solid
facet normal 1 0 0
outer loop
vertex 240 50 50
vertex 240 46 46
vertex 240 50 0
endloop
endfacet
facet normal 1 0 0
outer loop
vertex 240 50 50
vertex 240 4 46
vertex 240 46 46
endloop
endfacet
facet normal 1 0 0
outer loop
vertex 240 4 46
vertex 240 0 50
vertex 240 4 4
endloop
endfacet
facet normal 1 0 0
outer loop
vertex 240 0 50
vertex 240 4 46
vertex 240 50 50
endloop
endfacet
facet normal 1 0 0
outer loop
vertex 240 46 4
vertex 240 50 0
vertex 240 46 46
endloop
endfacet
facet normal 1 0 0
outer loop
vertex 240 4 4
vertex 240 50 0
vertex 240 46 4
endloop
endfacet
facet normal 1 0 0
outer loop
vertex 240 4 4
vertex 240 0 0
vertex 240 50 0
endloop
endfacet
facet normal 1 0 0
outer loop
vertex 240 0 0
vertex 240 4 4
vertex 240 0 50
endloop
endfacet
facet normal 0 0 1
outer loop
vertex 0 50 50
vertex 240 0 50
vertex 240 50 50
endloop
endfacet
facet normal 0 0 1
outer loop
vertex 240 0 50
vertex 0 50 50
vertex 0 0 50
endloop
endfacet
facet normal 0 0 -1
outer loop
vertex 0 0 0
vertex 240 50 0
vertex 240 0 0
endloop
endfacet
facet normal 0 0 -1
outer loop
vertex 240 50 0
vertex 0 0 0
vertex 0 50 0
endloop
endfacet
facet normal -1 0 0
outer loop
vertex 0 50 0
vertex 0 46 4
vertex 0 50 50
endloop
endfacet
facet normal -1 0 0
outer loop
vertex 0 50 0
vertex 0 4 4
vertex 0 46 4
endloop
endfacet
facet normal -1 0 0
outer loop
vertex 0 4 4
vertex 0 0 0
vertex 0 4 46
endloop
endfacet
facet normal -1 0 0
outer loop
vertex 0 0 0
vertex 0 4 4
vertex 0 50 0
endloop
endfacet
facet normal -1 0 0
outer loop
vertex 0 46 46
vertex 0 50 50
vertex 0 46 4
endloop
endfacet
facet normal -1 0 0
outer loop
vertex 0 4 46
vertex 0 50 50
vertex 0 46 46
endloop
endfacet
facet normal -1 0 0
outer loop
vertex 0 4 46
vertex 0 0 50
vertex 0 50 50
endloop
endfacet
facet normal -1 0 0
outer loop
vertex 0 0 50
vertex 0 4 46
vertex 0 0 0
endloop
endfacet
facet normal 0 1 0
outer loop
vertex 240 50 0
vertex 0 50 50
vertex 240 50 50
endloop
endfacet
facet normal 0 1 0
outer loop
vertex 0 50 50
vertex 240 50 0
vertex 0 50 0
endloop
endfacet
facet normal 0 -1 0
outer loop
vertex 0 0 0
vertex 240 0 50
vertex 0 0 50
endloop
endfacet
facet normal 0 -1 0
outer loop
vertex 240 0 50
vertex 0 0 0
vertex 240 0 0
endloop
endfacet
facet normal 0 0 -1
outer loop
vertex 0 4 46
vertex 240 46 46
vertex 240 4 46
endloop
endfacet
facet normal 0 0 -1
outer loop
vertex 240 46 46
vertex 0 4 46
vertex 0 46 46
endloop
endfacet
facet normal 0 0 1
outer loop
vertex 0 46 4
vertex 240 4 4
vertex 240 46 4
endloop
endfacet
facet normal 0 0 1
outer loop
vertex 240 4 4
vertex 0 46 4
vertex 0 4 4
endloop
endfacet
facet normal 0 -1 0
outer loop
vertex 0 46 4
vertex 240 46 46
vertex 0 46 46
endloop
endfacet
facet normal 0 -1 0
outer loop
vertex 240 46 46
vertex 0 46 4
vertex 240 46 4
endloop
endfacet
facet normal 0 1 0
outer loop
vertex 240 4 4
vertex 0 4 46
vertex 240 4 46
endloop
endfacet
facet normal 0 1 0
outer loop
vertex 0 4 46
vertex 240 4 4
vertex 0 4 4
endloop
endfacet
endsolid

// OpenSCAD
$fn = 32;

// ----------------------------------------------------------------------
// Box beam: 200-250 mm hollow beam
// ----------------------------------------------------------------------

// --- parameters (mm) ---
beam_l = 240;             // beam length, X
beam_w = 50;              // beam width, Y
beam_h = 50;              // beam height, Z
wall = 4;                 // wall thickness
fit_tol = 0.1;            // tolerance for press fits, mm
free_tol = 0.5;           // tolerance for clearance fits, mm

difference() {
  cube([beam_l, beam_w, beam_h]);
  translate([-1, wall, wall])
    cube([beam_l + 2, beam_w - 2 * wall, beam_h - 2 * wall]);
}
